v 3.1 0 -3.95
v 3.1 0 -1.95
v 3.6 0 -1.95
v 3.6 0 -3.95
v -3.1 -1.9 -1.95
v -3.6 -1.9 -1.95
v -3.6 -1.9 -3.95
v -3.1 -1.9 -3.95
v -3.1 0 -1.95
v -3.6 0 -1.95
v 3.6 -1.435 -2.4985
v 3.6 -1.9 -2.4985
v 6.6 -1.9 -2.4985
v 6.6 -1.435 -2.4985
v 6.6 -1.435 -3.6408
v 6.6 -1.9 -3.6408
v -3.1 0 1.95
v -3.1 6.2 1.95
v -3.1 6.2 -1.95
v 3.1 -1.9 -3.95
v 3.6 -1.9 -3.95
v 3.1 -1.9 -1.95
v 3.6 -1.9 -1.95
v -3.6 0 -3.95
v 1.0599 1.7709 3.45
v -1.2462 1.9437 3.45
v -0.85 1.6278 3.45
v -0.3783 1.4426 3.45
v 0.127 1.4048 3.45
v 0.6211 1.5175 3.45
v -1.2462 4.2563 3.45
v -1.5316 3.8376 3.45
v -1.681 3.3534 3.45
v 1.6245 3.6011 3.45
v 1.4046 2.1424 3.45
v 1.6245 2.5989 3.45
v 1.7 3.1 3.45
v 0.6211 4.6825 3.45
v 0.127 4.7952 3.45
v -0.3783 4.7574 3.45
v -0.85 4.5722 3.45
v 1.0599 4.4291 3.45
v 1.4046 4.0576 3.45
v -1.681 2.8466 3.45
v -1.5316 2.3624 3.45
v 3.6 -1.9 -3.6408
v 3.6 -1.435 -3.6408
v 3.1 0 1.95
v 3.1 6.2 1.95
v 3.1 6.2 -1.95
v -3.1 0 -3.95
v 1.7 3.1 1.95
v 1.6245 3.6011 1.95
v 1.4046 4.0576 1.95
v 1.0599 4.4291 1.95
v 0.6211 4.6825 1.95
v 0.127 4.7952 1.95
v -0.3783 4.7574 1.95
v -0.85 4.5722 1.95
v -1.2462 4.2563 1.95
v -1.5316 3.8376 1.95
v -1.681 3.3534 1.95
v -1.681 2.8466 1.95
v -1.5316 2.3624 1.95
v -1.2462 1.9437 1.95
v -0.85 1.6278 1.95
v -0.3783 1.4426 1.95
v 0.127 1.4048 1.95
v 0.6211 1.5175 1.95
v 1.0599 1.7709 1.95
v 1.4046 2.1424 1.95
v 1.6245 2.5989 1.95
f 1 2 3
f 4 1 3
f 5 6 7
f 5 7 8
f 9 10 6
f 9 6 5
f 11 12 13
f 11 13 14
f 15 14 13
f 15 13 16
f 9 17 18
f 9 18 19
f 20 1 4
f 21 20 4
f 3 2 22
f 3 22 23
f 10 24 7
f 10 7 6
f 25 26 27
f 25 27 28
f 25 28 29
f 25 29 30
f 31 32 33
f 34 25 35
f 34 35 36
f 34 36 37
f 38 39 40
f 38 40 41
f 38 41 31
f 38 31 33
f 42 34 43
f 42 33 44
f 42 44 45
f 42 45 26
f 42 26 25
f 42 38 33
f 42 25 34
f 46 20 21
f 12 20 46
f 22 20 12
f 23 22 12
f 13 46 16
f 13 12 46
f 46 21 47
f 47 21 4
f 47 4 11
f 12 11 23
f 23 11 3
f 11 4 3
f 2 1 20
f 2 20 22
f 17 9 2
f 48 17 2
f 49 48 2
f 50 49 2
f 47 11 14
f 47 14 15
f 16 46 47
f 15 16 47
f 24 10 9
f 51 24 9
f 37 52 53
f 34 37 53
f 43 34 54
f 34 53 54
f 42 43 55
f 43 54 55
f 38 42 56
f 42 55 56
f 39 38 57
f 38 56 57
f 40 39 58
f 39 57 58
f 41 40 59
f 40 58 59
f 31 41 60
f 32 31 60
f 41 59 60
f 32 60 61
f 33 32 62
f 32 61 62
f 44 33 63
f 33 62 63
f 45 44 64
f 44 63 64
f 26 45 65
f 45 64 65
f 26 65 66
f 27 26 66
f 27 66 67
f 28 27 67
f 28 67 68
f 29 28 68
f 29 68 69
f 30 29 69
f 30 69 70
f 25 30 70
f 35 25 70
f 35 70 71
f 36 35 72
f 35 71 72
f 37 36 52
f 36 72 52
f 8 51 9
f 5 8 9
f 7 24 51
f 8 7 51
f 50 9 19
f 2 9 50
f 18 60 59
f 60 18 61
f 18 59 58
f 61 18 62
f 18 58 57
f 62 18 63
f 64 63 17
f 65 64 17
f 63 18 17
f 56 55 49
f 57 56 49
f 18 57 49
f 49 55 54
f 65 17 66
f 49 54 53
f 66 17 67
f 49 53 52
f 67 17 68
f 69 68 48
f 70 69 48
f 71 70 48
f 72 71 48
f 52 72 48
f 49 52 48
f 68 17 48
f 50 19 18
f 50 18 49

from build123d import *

# Parameters (mm, degrees)
SKETCH1_W             = 6.2
SKETCH1_H             = 3.9
BOSS_EXTRUDE1_DEPTH   = 6.2
SKETCH2_R             = 1.7
BOSS_EXTRUDE2_DEPTH   = 1.5
SKETCH3_W             = 0.5
SKETCH3_H             = 2
BOSS_EXTRUDE3_DEPTH   = 1.9
BOSS_EXTRUDE3_2_DEPTH = 1.9
SKETCH4_W             = 1.14226937
SKETCH4_H             = 0.464957119
BOSS_EXTRUDE4_DEPTH   = 3


with BuildPart() as part:
    # Sketch1 → Boss-Extrude1 (new body)
    with BuildSketch(Plane(origin=(0, 0, 0), x_dir=(1, 0, 0), z_dir=(0, 1, 0))):
        Rectangle(SKETCH1_W, SKETCH1_H)
    extrude(amount=BOSS_EXTRUDE1_DEPTH)

    # Sketch2 → Boss-Extrude2 (add)
    with BuildSketch(Plane.XY.offset(1.95)):
        with Locations((0, 3.1)):
            Circle(SKETCH2_R)
    extrude(amount=BOSS_EXTRUDE2_DEPTH)


with BuildPart() as body_2:
    # Sketch3 → Boss-Extrude3 (new body)
    with BuildSketch(Plane.XZ):
        with Locations((3.35, -2.95)):
            Rectangle(SKETCH3_W, SKETCH3_H)
    extrude(amount=BOSS_EXTRUDE3_DEPTH)

    # Sketch4 → Boss-Extrude4 (add)
    with BuildSketch(Plane(origin=(3.6, 0, 0), x_dir=(0, 0, -1), z_dir=(1, 0, 0))):
        with Locations((3.069659625, -1.667521441)):
            Rectangle(SKETCH4_W, SKETCH4_H)
    extrude(amount=BOSS_EXTRUDE4_DEPTH)


with BuildPart() as body_3:
    # Sketch3 → Boss-Extrude3 2 (new body)
    with BuildSketch(Plane.XZ):
        with Locations((-3.35, -2.95)):
            Rectangle(SKETCH3_W, SKETCH3_H)
    extrude(amount=BOSS_EXTRUDE3_2_DEPTH)


solid = Compound([part.part, body_2.part, body_3.part])
